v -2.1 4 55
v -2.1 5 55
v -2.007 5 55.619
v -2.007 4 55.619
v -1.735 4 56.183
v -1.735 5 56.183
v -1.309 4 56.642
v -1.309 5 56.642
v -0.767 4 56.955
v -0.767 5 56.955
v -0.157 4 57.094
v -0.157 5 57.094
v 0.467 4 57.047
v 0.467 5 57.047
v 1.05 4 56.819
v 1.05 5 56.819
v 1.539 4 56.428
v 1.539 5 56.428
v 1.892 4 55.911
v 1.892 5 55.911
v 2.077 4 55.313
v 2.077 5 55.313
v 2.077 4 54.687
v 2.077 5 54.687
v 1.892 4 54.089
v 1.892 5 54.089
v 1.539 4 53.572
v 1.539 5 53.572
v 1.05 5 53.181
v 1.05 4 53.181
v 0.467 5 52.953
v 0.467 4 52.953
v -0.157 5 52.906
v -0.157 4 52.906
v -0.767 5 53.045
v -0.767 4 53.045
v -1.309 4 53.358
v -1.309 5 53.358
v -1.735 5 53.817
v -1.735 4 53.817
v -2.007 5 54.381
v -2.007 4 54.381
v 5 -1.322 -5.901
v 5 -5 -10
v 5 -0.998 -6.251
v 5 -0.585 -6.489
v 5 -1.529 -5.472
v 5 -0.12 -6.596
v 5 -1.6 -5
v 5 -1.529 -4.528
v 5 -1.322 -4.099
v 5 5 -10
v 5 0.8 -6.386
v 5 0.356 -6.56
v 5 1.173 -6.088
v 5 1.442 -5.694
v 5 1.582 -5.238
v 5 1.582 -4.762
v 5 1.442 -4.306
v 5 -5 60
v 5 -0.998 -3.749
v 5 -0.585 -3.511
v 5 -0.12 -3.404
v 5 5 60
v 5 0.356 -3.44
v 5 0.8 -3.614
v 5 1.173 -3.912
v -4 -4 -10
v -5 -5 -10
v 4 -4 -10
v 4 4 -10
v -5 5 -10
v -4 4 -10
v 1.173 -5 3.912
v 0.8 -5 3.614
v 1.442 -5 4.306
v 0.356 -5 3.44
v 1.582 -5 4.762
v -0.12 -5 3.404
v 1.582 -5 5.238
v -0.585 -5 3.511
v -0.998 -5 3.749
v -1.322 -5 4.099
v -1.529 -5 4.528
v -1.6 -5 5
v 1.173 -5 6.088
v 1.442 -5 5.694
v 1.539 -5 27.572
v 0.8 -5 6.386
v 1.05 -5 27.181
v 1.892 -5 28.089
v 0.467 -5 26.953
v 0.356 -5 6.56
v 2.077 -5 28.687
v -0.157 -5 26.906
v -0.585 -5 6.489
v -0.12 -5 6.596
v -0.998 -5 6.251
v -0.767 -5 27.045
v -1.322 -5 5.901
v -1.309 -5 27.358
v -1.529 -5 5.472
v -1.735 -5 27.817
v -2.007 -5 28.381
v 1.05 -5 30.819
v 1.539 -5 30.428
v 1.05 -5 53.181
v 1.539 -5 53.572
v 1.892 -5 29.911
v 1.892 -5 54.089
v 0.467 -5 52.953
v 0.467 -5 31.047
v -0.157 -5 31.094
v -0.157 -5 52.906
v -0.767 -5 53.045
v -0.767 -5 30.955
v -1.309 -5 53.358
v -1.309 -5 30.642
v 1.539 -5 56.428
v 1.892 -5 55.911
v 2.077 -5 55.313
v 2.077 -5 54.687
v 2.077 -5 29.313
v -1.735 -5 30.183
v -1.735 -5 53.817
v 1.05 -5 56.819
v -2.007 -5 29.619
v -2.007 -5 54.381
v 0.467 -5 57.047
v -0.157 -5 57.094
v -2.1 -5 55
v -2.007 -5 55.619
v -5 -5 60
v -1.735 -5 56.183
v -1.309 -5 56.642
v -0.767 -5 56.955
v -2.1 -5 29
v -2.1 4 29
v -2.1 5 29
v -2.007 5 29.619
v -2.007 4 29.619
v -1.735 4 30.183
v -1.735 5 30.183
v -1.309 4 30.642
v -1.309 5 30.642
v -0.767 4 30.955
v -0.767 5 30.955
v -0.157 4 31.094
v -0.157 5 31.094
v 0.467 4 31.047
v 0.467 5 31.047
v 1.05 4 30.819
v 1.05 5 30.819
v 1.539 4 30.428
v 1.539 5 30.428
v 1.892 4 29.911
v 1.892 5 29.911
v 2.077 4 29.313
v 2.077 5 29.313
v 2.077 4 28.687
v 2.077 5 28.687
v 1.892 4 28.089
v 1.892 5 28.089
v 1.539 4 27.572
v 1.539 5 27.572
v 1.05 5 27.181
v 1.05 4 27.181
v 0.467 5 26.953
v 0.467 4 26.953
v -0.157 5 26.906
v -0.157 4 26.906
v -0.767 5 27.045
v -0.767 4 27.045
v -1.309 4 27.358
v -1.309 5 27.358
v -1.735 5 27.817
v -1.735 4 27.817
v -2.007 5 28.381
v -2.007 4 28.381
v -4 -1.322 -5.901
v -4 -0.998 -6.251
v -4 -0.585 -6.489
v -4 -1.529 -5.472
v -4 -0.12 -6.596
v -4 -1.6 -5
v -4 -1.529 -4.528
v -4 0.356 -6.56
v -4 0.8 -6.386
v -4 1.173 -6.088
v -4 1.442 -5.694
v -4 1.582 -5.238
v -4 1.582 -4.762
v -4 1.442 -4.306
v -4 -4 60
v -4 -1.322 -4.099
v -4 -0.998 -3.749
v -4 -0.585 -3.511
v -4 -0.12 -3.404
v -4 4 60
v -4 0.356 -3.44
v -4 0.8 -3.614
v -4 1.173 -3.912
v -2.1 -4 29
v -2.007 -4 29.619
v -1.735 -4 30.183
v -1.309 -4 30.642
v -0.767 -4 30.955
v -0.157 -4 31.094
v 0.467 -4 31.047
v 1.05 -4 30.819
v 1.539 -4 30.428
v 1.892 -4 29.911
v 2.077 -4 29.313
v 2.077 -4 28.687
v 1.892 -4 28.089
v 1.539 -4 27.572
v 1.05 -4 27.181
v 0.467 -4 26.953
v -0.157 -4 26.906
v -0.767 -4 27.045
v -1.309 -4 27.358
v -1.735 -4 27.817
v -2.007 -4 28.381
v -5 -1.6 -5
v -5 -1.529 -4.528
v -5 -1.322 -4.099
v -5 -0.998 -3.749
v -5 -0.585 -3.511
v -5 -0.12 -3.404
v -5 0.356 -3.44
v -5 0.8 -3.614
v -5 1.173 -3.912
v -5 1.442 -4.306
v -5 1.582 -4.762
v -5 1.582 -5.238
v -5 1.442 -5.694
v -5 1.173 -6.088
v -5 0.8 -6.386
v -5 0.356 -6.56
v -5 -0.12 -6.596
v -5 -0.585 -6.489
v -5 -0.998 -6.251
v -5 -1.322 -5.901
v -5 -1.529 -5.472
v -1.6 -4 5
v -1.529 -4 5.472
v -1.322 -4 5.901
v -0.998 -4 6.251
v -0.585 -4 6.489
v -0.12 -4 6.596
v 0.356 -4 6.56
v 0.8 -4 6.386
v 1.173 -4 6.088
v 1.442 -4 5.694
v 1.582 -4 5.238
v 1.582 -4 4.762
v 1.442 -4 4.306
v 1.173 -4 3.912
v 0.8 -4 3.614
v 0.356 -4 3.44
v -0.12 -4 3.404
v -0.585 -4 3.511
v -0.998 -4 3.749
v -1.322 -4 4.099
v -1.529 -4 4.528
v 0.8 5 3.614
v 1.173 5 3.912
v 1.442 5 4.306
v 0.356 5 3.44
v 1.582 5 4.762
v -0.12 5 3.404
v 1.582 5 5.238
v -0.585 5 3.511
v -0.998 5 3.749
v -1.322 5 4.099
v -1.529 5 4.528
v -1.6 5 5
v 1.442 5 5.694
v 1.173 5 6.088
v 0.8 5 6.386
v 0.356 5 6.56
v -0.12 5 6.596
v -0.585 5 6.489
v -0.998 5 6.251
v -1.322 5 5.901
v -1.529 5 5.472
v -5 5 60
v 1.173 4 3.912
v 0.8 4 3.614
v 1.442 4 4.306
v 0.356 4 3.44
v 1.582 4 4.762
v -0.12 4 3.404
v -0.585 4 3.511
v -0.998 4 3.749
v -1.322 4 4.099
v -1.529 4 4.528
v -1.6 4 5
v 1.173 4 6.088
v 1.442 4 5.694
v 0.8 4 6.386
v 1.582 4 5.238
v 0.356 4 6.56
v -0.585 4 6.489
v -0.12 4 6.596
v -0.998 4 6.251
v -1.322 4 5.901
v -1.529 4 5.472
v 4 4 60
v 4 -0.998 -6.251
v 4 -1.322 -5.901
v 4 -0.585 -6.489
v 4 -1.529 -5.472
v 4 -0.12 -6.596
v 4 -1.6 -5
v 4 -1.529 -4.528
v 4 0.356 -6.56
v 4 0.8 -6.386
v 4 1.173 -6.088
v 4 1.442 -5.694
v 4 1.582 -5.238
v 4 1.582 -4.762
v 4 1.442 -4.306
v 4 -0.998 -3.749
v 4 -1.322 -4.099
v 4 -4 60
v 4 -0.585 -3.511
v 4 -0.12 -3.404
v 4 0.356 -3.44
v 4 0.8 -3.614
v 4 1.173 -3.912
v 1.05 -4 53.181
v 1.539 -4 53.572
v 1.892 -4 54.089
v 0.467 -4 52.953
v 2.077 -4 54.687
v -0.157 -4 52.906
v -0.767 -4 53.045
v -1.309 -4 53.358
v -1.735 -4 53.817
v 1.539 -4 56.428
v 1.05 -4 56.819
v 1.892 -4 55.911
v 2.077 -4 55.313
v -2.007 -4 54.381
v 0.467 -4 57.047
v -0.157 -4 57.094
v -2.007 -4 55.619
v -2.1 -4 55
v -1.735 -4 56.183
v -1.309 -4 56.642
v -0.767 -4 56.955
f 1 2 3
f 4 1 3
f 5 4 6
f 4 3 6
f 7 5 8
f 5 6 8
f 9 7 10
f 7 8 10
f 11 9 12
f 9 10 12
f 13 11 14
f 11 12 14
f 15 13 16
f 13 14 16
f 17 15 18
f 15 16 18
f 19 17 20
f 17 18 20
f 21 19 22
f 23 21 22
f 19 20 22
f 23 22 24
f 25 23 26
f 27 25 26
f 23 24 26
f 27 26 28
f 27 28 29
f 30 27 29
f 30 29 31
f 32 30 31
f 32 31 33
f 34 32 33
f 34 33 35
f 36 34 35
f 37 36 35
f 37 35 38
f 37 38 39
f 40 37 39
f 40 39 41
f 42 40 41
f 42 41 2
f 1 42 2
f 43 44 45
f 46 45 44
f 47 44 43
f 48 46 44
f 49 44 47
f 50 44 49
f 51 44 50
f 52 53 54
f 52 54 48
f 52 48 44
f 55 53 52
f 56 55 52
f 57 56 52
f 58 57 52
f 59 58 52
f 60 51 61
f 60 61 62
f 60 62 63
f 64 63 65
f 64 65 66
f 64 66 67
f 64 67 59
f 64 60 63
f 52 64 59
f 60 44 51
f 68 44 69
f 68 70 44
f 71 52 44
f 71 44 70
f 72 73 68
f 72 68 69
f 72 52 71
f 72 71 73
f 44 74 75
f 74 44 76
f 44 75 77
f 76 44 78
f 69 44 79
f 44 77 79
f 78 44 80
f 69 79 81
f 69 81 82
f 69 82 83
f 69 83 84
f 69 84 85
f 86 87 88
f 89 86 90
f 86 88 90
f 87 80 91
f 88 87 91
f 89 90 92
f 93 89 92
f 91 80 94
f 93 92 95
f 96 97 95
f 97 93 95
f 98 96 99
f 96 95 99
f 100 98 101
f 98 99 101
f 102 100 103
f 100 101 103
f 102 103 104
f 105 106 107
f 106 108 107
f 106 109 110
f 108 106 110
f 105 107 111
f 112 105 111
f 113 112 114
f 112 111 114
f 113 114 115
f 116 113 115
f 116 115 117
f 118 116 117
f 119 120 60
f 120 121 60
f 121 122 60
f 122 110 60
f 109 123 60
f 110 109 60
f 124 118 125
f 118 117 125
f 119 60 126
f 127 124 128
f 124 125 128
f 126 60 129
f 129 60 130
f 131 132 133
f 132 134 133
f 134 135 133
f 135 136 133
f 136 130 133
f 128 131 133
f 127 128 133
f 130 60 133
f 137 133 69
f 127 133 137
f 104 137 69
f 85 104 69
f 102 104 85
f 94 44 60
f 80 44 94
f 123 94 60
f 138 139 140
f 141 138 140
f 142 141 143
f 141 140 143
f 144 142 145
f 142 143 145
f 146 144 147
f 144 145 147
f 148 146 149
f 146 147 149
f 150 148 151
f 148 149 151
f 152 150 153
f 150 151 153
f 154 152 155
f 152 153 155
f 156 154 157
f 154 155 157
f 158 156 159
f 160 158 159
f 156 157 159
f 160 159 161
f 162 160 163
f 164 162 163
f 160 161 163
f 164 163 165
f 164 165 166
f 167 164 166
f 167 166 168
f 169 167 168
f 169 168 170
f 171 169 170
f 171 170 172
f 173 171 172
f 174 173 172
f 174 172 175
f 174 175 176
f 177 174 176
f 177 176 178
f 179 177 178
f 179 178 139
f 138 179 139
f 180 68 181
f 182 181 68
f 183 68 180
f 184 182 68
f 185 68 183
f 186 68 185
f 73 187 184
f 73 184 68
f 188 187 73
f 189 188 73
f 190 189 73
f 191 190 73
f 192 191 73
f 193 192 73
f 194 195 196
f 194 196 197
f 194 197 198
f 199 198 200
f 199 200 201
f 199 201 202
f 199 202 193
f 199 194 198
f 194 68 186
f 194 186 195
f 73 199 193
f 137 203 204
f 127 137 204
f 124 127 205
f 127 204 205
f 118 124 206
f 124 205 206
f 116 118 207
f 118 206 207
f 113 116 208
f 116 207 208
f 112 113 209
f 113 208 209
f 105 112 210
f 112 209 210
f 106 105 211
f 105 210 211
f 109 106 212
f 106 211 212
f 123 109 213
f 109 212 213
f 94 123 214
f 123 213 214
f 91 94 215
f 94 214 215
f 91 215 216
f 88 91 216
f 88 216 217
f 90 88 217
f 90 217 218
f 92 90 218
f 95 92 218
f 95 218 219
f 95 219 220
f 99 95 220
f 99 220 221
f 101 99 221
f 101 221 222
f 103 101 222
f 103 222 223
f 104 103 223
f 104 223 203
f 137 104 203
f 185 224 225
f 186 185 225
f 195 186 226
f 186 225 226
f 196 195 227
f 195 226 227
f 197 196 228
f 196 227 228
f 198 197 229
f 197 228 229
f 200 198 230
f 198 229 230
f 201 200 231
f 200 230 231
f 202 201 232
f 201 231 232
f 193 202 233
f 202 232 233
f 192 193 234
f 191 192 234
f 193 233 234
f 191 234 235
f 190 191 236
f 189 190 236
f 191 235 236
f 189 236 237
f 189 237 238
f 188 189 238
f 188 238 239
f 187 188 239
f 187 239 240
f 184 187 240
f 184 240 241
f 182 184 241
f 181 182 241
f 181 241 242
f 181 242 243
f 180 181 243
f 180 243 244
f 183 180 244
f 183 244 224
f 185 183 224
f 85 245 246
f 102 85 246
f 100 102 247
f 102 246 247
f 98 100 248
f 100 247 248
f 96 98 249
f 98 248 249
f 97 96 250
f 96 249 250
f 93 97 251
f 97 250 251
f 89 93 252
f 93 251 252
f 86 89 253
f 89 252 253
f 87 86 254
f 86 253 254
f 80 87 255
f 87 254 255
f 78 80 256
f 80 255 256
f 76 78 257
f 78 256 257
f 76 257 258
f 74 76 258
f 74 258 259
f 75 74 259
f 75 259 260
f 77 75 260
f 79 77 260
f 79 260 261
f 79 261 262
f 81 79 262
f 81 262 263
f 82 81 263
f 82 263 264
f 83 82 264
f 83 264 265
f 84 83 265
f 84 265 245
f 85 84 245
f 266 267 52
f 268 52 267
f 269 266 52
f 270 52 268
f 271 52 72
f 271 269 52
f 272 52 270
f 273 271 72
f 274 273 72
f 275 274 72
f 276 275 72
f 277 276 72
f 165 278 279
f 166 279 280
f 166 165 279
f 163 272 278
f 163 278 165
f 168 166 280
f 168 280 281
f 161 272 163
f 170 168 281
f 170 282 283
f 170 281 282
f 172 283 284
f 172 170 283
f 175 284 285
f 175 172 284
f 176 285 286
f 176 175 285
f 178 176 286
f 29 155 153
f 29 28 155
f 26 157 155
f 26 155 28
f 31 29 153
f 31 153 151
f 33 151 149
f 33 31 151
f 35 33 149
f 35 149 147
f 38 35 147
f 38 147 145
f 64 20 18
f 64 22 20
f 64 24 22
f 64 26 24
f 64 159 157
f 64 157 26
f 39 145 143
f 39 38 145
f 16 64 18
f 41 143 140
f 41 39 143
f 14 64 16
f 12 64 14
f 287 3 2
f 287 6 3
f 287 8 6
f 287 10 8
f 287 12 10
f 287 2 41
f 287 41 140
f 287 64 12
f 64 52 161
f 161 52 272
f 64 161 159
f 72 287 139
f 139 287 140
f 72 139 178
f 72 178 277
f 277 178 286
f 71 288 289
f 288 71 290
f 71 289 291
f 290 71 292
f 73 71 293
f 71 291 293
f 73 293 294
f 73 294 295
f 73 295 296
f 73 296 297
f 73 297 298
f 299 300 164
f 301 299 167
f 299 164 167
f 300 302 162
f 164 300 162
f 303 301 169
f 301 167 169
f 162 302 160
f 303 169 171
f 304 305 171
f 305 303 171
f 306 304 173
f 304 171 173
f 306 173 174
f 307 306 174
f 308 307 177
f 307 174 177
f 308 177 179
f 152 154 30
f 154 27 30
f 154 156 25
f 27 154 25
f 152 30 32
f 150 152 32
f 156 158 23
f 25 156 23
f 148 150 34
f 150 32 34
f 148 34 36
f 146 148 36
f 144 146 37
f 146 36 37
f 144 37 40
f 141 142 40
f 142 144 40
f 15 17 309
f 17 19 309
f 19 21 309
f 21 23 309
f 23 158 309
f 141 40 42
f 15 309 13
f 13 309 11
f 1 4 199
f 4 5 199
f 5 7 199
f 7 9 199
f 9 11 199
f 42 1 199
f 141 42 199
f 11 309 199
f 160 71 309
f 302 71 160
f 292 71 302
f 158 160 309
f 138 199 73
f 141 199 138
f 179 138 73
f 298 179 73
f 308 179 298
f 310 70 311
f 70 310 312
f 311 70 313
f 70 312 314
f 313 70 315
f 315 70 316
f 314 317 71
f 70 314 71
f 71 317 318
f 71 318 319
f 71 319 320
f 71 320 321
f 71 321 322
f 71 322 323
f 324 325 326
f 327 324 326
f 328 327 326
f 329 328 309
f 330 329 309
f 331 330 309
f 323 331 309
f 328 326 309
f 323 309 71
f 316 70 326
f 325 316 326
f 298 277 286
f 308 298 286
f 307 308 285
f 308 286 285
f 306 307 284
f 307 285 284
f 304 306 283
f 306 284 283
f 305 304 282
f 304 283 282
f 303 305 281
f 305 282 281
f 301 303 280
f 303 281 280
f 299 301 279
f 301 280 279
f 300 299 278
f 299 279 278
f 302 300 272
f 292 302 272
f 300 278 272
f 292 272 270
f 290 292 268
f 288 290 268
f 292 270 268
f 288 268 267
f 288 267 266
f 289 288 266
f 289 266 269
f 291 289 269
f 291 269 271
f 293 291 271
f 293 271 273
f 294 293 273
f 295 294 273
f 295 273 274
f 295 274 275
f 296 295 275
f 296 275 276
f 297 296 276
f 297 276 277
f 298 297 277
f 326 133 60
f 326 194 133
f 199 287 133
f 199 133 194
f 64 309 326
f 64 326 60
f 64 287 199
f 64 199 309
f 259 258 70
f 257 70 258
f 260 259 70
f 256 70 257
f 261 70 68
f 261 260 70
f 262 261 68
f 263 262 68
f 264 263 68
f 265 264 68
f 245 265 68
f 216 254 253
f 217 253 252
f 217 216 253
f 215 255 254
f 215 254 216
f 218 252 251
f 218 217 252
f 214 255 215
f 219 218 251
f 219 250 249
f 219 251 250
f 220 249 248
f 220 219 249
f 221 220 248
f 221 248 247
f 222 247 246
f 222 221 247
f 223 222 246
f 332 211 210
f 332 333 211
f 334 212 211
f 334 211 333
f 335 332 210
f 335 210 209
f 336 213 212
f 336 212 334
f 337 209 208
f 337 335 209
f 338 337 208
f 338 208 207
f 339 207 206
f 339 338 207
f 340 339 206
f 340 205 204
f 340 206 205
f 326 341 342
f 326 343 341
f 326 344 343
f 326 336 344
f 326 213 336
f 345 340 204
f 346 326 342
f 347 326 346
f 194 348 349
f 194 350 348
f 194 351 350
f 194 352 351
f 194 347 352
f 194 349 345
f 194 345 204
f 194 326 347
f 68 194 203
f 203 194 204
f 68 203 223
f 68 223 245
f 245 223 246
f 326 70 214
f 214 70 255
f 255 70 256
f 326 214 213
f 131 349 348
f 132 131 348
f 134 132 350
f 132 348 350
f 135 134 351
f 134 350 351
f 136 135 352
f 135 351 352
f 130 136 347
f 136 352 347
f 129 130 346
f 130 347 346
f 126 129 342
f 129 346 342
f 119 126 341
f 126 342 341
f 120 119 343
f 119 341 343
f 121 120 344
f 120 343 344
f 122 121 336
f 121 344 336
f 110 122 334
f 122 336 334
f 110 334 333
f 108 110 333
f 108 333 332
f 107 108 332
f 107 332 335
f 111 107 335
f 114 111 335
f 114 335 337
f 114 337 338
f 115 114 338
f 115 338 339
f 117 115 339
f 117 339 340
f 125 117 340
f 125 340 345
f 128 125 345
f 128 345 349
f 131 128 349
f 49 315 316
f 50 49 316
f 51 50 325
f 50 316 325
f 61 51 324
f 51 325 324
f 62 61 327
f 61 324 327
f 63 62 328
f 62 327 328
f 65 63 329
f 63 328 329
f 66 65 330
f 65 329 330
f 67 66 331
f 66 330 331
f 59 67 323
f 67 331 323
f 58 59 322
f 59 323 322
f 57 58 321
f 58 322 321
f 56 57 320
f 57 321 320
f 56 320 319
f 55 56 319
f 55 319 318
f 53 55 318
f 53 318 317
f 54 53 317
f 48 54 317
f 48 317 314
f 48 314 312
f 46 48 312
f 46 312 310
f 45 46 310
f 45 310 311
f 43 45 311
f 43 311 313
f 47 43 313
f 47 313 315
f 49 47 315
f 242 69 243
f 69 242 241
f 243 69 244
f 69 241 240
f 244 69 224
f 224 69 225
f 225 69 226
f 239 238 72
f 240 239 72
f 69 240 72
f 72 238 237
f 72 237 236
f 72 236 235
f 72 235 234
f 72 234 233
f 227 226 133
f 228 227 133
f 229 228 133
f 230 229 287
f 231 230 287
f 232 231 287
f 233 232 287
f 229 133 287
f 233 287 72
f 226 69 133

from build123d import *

# Parameters (mm, degrees)
SKETCH_1_W          = 10
SKETCH_1_H          = 10
SKETCH_1_W_2        = 8
SKETCH_1_H_2        = 8
EXTRUDE_1_DEPTH     = 60
SKETCH_3_R          = 2.1
SKETCH_3_R_2        = 1.6
CUT_EXTRUDE_1_DEPTH = 62.032778079
SKETCH_7_W          = 10
SKETCH_7_H          = 10
SKETCH_7_W_2        = 8
SKETCH_7_H_2        = 8
EXTRUDE_1_2_DEPTH   = 10
SKETCH_8_R          = 1.6
CUT_EXTRUDE_5_DEPTH = 62.032778079


with BuildPart() as part:
    # ｽｹｯﾁ1 → Extrude 1 (new body)
    with BuildSketch(Plane.XY):
        Rectangle(SKETCH_1_W, SKETCH_1_H)
        Rectangle(SKETCH_1_W_2, SKETCH_1_H_2, mode=Mode.SUBTRACT)
    extrude(amount=EXTRUDE_1_DEPTH)

    # ｽｹｯﾁ3 → ｶｯﾄ - 押し出し1 (cut, through all)
    with BuildSketch(Plane(origin=(0, 5, 0), x_dir=(1, 0, 0), z_dir=(0, 1, 0))):
        with Locations(Location((0, -55, 0), (0, 0, 180))):
            Circle(SKETCH_3_R)
        with Locations(Location((0, -29, 0), (0, 0, 180))):
            Circle(SKETCH_3_R)
        with Locations(Location((0, -5, 0), (0, 0, 180))):
            Circle(SKETCH_3_R_2)
    extrude(amount=-CUT_EXTRUDE_1_DEPTH, mode=Mode.SUBTRACT)

    # ｽｹｯﾁ7 → Extrude 1 2 (add)
    with BuildSketch(Plane(origin=(0, 0, 0), x_dir=(-1, 0, 0), z_dir=(0, 0, -1))):
        Rectangle(SKETCH_7_W, SKETCH_7_H)
        Rectangle(SKETCH_7_W_2, SKETCH_7_H_2, mode=Mode.SUBTRACT)
    extrude(amount=EXTRUDE_1_2_DEPTH)

    # ｽｹｯﾁ8 → ｶｯﾄ - 押し出し5 (cut, through all)
    with BuildSketch(Plane.ZY.offset(5)):
        with Locations(Location((-5, 0, 0), (0, 0, 270))):
            Circle(SKETCH_8_R)
    extrude(amount=-CUT_EXTRUDE_5_DEPTH, mode=Mode.SUBTRACT)


solid = part.part
